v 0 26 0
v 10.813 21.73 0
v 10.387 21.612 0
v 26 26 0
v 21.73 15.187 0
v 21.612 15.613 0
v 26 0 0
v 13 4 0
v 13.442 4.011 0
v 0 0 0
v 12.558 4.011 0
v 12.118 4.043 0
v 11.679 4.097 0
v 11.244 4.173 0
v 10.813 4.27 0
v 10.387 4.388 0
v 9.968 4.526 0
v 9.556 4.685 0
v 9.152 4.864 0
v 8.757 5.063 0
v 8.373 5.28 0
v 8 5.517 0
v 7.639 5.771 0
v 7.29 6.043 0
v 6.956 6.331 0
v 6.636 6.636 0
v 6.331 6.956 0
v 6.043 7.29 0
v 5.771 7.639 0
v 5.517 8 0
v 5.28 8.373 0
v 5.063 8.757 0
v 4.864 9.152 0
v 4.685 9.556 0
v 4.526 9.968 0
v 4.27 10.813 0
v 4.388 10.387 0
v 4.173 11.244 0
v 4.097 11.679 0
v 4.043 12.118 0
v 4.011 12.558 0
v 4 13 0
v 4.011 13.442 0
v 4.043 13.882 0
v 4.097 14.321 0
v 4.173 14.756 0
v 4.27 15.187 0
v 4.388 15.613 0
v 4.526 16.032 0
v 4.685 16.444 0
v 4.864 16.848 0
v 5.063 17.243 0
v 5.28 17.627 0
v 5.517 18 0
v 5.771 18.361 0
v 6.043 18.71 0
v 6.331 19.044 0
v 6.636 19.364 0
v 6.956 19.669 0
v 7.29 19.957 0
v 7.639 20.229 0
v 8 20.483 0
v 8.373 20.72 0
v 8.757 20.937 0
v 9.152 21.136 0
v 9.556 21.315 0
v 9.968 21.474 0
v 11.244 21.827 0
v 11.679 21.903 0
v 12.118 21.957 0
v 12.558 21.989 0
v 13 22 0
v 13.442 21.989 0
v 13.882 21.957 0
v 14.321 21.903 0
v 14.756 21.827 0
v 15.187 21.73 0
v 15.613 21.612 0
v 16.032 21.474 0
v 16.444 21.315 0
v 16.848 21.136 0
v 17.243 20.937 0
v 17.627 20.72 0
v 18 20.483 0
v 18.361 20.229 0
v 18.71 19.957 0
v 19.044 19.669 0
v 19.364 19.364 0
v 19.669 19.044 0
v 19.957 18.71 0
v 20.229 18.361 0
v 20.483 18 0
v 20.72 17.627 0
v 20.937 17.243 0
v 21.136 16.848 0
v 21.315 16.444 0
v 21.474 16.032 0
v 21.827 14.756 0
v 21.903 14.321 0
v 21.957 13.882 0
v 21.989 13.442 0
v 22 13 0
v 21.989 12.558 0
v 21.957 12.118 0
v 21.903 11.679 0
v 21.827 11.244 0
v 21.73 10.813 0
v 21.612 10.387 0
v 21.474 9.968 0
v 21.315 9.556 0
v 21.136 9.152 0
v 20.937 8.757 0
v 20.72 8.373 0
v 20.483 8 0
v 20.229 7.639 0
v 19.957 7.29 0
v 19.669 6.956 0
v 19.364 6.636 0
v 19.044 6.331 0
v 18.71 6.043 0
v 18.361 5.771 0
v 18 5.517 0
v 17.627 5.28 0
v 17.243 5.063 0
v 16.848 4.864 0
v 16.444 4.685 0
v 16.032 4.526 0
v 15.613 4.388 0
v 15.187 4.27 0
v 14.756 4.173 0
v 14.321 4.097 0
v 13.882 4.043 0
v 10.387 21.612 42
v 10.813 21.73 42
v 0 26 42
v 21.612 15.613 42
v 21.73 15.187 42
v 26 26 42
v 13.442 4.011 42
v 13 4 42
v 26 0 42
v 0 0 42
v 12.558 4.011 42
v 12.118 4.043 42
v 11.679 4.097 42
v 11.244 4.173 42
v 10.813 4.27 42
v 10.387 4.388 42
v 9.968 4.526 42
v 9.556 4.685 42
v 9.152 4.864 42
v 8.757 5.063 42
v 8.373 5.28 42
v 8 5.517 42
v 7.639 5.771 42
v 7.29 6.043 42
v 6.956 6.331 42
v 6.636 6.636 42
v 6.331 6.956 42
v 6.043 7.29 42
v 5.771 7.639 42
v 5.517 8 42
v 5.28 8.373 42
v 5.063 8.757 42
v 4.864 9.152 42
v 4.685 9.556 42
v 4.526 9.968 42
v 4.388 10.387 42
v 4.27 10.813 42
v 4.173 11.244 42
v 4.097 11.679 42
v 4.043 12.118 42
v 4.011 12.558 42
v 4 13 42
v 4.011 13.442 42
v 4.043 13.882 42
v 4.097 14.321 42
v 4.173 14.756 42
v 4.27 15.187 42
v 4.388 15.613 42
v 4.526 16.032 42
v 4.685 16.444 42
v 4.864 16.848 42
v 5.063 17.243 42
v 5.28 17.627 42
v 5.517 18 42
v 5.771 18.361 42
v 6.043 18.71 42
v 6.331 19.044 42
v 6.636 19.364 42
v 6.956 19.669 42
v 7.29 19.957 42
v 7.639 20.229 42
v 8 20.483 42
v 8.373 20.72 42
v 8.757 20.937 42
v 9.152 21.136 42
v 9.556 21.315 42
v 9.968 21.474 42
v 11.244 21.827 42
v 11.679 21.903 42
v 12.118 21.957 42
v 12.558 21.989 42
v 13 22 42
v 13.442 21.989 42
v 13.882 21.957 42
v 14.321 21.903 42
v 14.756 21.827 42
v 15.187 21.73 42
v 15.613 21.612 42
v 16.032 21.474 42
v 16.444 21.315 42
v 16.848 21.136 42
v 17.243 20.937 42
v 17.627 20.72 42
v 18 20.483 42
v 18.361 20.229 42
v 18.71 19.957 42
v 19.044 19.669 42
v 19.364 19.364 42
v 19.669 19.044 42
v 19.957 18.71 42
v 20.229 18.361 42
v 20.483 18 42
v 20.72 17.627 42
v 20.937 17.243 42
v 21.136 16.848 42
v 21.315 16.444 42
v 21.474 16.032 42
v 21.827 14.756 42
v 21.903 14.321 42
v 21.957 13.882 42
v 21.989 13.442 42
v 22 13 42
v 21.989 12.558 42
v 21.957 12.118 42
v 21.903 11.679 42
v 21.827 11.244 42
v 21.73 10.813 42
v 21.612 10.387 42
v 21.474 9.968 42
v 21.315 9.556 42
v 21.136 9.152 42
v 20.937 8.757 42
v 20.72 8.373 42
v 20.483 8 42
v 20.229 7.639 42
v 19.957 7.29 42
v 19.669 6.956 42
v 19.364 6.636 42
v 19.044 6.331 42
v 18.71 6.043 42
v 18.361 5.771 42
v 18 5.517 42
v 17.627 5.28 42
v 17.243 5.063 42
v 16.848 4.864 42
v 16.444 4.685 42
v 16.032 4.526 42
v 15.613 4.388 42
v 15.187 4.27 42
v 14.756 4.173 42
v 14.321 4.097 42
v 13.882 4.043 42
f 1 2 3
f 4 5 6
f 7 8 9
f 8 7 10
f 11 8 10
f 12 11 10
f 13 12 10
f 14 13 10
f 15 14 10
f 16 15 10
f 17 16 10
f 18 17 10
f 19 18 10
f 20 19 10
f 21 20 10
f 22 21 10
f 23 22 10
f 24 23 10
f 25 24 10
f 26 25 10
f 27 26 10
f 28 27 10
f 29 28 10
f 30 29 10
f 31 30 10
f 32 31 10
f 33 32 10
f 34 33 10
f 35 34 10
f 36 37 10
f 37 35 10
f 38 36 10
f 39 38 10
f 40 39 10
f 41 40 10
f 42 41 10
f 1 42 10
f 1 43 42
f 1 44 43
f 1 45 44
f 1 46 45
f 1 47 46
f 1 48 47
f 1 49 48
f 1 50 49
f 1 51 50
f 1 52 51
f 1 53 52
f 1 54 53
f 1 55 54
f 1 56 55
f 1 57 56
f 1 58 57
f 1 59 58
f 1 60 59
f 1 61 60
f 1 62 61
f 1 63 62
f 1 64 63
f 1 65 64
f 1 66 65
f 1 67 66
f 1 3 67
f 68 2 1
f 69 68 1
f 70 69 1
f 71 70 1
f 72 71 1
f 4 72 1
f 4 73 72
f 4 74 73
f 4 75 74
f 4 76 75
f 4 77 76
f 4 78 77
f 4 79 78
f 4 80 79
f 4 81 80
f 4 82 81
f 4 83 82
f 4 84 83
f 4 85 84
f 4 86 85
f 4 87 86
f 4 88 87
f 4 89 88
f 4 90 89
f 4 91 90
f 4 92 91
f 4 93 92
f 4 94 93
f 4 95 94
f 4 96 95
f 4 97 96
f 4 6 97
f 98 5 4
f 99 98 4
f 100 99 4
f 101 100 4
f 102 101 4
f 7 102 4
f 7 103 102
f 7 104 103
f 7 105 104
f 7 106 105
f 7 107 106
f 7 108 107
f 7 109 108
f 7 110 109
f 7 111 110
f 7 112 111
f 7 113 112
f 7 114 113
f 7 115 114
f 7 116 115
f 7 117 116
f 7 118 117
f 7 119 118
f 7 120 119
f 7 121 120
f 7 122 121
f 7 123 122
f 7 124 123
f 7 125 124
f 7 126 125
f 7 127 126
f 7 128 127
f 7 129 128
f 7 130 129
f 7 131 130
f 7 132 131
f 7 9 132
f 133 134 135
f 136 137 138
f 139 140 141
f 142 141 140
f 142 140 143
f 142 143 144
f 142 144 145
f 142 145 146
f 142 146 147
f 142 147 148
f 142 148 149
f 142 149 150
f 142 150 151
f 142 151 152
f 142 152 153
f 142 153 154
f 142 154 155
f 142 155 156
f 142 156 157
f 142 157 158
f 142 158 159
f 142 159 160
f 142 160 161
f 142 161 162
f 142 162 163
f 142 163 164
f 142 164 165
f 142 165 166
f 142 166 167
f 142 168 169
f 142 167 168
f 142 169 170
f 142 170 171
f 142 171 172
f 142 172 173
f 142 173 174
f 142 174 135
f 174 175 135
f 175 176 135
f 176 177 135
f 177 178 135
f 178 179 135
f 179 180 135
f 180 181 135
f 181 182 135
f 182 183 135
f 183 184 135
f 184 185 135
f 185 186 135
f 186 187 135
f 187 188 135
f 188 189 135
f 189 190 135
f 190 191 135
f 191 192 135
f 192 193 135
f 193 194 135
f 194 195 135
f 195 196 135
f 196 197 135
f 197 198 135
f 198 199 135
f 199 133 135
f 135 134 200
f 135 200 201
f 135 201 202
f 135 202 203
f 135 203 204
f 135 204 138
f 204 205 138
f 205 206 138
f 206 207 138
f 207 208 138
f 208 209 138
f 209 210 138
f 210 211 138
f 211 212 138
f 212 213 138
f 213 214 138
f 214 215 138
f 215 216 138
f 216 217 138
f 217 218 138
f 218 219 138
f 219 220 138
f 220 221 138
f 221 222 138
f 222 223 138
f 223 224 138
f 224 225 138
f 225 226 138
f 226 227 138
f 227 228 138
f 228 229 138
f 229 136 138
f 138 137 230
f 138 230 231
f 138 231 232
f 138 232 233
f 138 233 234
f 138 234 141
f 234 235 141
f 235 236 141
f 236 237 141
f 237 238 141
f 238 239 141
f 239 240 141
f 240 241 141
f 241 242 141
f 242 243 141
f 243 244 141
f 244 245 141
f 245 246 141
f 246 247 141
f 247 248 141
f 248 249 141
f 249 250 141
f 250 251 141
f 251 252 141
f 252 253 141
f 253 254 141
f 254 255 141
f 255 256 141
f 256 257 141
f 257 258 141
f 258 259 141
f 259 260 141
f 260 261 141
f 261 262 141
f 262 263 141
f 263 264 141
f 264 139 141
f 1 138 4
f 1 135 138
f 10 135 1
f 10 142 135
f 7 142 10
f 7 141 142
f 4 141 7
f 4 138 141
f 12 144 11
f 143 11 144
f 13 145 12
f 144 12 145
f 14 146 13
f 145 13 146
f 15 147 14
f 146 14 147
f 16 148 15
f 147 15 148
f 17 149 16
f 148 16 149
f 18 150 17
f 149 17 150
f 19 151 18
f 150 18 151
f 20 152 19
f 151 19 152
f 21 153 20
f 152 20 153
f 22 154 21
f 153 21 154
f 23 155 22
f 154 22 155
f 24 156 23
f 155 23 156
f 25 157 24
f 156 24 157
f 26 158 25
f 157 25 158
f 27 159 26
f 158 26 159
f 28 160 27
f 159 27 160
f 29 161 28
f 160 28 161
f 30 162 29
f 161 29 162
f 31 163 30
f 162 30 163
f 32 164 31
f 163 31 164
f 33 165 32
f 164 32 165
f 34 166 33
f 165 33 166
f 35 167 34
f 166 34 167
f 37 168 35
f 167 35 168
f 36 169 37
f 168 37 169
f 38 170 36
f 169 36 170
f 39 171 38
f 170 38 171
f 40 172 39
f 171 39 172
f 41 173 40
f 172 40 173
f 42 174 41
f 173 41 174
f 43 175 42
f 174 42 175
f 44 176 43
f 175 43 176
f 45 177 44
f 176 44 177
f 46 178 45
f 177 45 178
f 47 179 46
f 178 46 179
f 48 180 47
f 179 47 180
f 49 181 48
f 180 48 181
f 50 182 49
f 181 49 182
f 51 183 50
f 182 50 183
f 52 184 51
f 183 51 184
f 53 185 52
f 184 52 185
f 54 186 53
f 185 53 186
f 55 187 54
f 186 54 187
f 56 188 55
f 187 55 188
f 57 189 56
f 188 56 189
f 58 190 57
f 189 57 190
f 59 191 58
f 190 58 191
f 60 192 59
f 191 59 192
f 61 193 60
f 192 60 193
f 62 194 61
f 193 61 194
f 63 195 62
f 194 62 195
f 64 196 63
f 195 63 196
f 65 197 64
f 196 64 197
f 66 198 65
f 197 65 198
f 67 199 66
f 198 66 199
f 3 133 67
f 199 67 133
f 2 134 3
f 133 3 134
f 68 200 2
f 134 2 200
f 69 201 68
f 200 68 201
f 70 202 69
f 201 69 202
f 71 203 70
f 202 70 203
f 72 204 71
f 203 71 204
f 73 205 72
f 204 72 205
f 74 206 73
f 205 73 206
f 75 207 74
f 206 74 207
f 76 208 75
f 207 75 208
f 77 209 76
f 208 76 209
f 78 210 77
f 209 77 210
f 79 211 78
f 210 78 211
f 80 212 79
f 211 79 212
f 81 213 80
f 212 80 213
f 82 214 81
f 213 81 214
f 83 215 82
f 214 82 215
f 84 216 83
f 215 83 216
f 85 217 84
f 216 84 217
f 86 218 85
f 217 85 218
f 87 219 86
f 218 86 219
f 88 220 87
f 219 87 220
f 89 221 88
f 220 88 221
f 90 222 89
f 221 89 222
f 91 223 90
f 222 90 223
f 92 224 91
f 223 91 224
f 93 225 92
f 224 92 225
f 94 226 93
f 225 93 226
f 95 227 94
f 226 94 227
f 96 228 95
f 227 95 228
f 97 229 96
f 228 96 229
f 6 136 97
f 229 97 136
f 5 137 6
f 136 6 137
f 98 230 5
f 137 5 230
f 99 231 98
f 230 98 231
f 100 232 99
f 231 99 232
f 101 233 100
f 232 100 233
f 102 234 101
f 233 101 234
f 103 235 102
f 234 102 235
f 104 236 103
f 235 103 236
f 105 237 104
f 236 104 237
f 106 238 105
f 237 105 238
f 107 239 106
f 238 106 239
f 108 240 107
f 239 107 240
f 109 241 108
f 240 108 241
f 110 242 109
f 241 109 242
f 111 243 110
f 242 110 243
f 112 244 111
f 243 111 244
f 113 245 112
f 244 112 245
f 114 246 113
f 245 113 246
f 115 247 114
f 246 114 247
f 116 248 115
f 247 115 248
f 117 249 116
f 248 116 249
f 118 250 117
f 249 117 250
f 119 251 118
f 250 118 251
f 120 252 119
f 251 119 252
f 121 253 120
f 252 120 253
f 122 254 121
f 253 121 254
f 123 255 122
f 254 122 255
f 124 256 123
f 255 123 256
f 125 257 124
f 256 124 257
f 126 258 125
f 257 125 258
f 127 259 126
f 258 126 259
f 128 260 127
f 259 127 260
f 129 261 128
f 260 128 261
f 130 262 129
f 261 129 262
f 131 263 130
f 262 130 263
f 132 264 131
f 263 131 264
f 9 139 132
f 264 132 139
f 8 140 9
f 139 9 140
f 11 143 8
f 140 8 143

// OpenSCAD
$fn = $preview? 32 : 128;

MODEL_NAME = "5ml Test Tubes Tray";
MODEL_VERSION = "0.1.0";

TEST_TUBE_HEIGHT = 42;
TEST_TUBE_CAP_DIAMETER = 20;
TEST_TUBE_DIAMETER = 16;

// Distance between neighbouring test tube caps in the tray
TEST_TUBE_GRID_COLUMNS_NUM = 1;
TEST_TUBE_GRID_ROWS_NUM = 1;
TEST_TUBE_GRID_SPACING = 3;

// Width of a single test tube cell in a grid
TEST_TUBE_CELL_WIDTH = TEST_TUBE_CAP_DIAMETER + 2 * TEST_TUBE_GRID_SPACING;
TEST_TUBE_CELL_HEIGHT = TEST_TUBE_HEIGHT;

TEST_TUBE_CELL_CUTOUT_PADDING = 2;
TEST_TUBE_CELL_CUTOUT_DIAMETER = TEST_TUBE_DIAMETER + TEST_TUBE_CELL_CUTOUT_PADDING;


module main() {
    linear_extrude(height=TEST_TUBE_CELL_HEIGHT) {
        translate(v=[TEST_TUBE_CELL_WIDTH / 2, TEST_TUBE_CELL_WIDTH / 2]) {
            for (row=[0 : TEST_TUBE_GRID_ROWS_NUM - 1]) {
                for (column=[0 : TEST_TUBE_GRID_COLUMNS_NUM - 1]) {
                    translate(v=[TEST_TUBE_CELL_WIDTH * column, TEST_TUBE_CELL_WIDTH * row]) {
                        difference() {
                            square(size=[TEST_TUBE_CELL_WIDTH, TEST_TUBE_CELL_WIDTH], center=true);
                            circle(d=TEST_TUBE_CELL_CUTOUT_DIAMETER);
                        }
                    }
                }
            }
        }
    }
}


main();
